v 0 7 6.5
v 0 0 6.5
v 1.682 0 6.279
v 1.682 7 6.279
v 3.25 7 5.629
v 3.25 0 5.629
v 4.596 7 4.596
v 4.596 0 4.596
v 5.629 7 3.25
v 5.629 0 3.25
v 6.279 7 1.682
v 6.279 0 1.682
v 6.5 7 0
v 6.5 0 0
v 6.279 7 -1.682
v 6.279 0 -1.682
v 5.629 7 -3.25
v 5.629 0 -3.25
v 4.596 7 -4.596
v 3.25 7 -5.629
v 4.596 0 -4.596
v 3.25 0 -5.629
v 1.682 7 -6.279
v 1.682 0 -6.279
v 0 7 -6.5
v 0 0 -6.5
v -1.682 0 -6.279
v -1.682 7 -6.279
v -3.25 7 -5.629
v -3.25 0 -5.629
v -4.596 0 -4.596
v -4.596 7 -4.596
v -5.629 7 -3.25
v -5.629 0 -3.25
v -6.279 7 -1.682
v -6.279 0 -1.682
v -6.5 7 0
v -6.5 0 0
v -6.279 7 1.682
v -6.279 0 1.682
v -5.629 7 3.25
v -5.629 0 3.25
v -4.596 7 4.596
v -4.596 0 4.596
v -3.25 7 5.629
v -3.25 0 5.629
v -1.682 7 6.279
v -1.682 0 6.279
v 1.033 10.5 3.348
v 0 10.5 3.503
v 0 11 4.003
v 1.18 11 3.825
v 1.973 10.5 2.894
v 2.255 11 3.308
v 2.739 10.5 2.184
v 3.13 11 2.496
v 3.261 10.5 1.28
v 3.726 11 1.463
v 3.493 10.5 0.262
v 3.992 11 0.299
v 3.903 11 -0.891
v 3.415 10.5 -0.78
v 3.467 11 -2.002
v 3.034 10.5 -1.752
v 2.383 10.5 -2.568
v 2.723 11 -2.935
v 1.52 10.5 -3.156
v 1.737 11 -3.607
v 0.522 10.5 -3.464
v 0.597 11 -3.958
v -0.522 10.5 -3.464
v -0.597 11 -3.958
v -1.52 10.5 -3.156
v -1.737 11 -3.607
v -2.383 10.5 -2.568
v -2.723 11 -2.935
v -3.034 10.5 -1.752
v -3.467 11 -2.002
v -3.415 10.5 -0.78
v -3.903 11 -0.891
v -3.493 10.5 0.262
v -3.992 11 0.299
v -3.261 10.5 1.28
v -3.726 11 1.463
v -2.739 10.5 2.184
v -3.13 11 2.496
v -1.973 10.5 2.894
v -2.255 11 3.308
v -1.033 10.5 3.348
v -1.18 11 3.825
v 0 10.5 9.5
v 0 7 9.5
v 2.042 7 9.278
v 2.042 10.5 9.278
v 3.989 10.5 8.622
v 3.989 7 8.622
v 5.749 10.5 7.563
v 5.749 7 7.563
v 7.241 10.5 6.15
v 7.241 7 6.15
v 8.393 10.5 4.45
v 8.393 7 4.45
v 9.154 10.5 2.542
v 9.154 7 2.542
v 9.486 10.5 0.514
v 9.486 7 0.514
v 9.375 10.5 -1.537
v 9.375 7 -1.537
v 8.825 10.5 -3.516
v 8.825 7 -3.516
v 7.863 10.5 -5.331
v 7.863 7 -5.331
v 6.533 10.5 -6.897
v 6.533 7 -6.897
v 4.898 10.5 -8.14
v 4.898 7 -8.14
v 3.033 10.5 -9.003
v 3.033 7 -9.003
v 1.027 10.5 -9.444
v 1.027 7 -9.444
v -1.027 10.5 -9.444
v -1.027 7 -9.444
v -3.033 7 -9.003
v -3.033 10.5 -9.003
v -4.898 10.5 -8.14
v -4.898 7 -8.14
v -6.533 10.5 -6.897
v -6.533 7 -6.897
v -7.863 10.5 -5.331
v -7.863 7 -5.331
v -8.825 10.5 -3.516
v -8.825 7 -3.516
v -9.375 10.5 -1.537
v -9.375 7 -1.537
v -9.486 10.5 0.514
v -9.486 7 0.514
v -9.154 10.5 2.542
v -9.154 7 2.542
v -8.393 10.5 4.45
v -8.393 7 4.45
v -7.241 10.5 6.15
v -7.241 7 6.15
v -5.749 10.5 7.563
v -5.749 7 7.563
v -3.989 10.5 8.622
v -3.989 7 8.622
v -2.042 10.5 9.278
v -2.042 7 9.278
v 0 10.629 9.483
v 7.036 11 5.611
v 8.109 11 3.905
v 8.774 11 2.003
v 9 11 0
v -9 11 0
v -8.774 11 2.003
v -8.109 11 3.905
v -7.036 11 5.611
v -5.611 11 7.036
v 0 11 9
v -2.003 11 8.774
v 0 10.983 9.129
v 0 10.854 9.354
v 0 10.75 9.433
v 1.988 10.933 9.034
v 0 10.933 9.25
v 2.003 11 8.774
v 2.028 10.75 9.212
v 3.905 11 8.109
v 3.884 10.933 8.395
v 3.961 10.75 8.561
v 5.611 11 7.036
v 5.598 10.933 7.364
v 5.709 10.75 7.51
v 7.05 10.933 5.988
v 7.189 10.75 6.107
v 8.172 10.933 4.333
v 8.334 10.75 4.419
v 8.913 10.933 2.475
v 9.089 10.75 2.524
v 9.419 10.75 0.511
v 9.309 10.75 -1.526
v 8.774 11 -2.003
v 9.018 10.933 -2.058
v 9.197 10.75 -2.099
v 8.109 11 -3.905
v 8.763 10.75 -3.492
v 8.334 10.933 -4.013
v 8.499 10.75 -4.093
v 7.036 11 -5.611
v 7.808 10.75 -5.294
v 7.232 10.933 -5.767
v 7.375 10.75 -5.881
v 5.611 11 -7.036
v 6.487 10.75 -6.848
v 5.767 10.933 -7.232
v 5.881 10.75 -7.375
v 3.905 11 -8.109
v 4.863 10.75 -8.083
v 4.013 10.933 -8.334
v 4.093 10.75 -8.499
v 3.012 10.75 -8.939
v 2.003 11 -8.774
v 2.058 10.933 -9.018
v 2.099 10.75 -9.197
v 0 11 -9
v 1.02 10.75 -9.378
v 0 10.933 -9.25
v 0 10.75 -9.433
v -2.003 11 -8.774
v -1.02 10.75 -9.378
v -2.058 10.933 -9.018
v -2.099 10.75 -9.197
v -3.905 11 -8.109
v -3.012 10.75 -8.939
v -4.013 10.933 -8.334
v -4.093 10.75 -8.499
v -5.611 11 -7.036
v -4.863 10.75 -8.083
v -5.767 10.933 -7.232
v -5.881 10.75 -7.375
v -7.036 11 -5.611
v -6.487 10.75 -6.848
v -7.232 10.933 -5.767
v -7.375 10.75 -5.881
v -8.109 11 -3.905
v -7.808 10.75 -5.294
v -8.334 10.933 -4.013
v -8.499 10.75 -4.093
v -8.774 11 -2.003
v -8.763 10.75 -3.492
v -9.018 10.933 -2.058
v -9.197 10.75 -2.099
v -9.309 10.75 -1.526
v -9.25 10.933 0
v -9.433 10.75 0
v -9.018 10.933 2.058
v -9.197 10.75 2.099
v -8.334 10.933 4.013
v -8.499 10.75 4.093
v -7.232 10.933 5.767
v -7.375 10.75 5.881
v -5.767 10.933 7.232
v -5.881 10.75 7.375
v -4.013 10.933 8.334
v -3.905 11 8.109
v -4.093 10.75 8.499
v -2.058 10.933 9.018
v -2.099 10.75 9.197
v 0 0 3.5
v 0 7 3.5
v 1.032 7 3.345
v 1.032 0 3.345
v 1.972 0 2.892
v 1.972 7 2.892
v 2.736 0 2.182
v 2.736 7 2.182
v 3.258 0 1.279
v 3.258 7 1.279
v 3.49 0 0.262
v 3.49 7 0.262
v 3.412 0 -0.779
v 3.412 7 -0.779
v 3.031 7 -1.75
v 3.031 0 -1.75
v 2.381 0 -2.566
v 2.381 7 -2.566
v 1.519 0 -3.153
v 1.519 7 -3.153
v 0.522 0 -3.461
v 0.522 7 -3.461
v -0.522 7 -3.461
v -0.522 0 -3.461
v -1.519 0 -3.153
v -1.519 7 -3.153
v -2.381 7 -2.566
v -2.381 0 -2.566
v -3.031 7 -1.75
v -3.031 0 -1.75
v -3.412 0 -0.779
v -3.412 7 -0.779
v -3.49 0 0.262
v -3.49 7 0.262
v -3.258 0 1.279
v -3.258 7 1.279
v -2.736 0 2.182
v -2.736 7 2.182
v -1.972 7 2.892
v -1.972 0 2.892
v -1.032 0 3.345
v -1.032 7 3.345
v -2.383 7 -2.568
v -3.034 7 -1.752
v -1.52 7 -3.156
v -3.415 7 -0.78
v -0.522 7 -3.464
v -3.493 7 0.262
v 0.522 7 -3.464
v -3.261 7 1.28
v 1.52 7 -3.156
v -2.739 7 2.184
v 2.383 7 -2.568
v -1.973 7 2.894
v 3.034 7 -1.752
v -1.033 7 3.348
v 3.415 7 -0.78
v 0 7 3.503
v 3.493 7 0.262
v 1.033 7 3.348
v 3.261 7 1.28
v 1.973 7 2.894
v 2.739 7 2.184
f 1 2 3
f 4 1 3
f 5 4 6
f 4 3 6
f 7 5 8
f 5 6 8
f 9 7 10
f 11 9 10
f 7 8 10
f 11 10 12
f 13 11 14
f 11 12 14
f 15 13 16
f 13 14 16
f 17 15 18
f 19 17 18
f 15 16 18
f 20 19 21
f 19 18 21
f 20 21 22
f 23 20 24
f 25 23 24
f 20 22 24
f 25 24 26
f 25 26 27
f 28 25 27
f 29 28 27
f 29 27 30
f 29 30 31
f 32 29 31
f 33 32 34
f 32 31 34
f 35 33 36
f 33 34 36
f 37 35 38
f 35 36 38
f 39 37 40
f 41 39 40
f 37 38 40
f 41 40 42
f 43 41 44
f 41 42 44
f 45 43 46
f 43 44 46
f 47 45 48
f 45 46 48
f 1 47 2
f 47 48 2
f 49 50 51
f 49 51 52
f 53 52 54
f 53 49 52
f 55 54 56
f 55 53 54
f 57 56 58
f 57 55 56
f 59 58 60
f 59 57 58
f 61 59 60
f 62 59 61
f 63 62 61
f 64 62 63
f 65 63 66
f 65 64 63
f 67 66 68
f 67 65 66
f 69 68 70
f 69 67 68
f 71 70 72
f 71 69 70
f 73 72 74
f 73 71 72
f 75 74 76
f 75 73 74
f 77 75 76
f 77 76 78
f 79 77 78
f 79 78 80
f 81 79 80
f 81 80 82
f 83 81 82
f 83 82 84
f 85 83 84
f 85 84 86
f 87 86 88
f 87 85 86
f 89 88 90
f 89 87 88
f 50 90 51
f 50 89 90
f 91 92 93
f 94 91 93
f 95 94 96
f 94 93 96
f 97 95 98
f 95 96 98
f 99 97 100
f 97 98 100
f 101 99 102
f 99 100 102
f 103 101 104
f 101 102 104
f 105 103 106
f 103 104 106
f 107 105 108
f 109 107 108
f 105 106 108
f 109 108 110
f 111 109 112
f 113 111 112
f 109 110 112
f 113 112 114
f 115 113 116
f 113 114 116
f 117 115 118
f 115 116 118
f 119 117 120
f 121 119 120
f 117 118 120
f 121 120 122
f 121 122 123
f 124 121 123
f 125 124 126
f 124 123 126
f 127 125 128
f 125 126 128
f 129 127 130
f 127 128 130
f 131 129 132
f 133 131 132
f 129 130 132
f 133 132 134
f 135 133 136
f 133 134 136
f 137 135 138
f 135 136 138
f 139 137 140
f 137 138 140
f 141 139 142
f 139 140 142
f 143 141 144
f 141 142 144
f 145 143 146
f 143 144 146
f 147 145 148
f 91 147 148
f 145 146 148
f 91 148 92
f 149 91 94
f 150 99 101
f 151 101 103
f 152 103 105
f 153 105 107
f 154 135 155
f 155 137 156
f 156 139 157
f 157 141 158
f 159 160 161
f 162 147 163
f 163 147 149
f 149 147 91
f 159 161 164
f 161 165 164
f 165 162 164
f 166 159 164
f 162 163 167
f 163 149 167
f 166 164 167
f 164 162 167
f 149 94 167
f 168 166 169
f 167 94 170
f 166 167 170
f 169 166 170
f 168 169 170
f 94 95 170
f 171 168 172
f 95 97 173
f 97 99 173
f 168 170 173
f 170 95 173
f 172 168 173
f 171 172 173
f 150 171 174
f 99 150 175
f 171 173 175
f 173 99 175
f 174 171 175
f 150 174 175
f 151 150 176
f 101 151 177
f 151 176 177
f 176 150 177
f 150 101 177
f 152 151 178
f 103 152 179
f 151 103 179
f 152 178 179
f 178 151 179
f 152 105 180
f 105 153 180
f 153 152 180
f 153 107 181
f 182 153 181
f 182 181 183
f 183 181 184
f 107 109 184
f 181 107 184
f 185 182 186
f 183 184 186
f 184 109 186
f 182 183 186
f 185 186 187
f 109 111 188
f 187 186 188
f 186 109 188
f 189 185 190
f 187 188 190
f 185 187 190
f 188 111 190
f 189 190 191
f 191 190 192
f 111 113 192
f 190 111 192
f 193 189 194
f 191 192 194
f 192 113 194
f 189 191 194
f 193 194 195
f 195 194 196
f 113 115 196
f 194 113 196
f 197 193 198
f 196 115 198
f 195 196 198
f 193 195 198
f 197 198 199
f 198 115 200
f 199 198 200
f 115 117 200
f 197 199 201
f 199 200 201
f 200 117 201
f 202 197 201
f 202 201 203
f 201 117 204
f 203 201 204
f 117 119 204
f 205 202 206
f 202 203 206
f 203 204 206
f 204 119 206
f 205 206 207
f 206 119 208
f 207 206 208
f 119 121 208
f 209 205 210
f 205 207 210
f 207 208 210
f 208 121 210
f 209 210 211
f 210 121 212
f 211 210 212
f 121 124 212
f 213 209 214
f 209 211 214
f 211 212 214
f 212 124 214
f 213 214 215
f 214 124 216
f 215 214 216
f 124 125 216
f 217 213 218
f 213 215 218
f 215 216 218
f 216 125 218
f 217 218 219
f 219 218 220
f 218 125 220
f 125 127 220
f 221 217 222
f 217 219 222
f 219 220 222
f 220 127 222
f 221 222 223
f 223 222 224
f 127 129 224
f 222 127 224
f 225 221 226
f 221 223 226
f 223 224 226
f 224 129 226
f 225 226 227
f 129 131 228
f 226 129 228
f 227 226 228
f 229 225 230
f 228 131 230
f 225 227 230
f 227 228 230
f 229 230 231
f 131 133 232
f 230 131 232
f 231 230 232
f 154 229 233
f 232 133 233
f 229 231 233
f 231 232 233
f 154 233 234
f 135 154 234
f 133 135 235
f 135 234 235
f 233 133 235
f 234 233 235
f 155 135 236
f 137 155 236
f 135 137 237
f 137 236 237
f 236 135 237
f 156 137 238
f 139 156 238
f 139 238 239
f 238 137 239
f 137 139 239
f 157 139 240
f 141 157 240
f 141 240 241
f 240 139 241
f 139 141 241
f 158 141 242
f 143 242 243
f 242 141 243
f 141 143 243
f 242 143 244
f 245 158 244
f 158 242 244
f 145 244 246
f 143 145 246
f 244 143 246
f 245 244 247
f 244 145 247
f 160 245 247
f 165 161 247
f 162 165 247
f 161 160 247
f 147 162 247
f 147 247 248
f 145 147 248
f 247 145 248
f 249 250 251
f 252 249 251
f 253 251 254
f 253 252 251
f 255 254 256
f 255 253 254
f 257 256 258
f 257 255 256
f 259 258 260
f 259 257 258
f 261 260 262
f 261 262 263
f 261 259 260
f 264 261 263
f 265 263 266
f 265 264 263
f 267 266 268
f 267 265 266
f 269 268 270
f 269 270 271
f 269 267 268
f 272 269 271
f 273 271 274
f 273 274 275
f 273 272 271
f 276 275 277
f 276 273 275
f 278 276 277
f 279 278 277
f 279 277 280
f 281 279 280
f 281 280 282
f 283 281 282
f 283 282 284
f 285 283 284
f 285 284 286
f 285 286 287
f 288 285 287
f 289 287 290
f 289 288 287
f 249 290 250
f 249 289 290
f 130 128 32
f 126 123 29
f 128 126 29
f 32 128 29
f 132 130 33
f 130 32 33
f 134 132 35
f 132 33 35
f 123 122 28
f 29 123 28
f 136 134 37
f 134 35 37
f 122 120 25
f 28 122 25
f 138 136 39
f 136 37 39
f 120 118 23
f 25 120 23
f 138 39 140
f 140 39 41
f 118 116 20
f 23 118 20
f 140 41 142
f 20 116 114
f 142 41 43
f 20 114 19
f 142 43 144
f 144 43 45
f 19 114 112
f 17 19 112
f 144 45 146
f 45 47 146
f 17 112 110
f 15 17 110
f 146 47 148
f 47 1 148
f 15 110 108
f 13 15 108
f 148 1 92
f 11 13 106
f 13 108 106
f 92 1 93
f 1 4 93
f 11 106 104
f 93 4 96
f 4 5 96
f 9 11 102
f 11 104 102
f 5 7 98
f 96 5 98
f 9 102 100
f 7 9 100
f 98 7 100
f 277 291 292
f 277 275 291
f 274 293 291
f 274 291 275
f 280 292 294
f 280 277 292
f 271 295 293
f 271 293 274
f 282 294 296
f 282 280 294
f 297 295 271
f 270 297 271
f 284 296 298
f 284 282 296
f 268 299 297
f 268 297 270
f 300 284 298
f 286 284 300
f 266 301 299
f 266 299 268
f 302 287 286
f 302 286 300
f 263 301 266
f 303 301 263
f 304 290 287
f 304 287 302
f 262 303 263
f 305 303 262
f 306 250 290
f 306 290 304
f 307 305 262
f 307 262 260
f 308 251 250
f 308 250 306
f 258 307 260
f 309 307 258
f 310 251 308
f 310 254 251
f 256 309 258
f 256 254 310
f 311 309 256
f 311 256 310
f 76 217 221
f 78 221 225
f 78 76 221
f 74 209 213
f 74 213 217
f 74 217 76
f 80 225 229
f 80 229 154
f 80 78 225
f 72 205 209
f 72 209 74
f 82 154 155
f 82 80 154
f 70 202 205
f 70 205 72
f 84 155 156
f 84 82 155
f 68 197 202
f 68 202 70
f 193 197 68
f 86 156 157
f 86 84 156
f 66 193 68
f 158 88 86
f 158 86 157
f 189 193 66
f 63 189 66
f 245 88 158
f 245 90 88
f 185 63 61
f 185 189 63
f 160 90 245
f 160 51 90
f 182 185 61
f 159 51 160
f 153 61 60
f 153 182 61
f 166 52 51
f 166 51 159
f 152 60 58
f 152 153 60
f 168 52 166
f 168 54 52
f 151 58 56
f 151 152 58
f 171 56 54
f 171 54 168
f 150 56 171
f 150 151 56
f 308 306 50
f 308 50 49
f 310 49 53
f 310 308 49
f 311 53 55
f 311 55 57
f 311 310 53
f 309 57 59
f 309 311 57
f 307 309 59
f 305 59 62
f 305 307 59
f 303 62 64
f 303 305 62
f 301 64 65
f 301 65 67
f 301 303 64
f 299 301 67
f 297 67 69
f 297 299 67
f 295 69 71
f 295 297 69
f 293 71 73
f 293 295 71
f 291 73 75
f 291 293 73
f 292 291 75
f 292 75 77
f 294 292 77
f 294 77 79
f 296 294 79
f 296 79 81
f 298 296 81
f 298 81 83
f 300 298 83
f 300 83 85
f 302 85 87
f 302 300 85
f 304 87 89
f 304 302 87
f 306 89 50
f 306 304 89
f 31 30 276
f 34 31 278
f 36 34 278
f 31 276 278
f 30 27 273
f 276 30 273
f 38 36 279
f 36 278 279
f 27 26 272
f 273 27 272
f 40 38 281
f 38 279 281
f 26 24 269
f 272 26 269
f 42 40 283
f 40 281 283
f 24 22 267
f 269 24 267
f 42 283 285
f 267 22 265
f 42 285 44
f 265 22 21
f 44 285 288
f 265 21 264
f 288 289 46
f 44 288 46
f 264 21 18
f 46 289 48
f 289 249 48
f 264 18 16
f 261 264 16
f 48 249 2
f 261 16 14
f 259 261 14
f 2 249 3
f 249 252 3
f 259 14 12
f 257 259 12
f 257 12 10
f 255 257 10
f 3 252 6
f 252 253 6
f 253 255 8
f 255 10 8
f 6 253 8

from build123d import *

# Parameters (mm, degrees)
SKETCH1_R           = 6.5
SKETCH1_R_2         = 3.5
BOSS_EXTRUDE1_DEPTH = 7
SKETCH2_R           = 9.5
SKETCH2_R_2         = 3.503174071
BOSS_EXTRUDE3_DEPTH = 4
CHAMFER1_SIZE       = 0.5
FILLET1_R           = 0.5


with BuildPart() as part:
    # Sketch1 → Boss-Extrude1 (new body)
    with BuildSketch(Plane(origin=(0, 0, 0), x_dir=(1, 0, 0), z_dir=(0, 1, 0))):
        with Locations(Location((0, 0, 0), (0, 0, 270))):
            Circle(SKETCH1_R)
        with Locations(Location((0, 0, 0), (0, 0, 270))):
            Circle(SKETCH1_R_2, mode=Mode.SUBTRACT)
    extrude(amount=BOSS_EXTRUDE1_DEPTH)

    # Sketch2 → Boss-Extrude3 (add)
    with BuildSketch(Plane(origin=(0, 7, 0), x_dir=(1, 0, 0), z_dir=(0, 1, 0))):
        with Locations(Location((0, 0, 0), (0, 0, 270))):
            Circle(SKETCH2_R)
        with Locations(Location((0, 0, 0), (0, 0, 270))):
            Circle(SKETCH2_R_2, mode=Mode.SUBTRACT)
    extrude(amount=BOSS_EXTRUDE3_DEPTH)

    # Chamfer1
    chamfer1_edges = [part.edges().sort_by_distance(p)[0] for p in [
        (0, 11, -3.503174071),
    ]]
    chamfer(chamfer1_edges, length=CHAMFER1_SIZE)

    # Fillet1
    fillet1_edges = [part.edges().sort_by_distance(p)[0] for p in [
        (0, 11, -9.5),
    ]]
    fillet(fillet1_edges, radius=FILLET1_R)


solid = part.part
